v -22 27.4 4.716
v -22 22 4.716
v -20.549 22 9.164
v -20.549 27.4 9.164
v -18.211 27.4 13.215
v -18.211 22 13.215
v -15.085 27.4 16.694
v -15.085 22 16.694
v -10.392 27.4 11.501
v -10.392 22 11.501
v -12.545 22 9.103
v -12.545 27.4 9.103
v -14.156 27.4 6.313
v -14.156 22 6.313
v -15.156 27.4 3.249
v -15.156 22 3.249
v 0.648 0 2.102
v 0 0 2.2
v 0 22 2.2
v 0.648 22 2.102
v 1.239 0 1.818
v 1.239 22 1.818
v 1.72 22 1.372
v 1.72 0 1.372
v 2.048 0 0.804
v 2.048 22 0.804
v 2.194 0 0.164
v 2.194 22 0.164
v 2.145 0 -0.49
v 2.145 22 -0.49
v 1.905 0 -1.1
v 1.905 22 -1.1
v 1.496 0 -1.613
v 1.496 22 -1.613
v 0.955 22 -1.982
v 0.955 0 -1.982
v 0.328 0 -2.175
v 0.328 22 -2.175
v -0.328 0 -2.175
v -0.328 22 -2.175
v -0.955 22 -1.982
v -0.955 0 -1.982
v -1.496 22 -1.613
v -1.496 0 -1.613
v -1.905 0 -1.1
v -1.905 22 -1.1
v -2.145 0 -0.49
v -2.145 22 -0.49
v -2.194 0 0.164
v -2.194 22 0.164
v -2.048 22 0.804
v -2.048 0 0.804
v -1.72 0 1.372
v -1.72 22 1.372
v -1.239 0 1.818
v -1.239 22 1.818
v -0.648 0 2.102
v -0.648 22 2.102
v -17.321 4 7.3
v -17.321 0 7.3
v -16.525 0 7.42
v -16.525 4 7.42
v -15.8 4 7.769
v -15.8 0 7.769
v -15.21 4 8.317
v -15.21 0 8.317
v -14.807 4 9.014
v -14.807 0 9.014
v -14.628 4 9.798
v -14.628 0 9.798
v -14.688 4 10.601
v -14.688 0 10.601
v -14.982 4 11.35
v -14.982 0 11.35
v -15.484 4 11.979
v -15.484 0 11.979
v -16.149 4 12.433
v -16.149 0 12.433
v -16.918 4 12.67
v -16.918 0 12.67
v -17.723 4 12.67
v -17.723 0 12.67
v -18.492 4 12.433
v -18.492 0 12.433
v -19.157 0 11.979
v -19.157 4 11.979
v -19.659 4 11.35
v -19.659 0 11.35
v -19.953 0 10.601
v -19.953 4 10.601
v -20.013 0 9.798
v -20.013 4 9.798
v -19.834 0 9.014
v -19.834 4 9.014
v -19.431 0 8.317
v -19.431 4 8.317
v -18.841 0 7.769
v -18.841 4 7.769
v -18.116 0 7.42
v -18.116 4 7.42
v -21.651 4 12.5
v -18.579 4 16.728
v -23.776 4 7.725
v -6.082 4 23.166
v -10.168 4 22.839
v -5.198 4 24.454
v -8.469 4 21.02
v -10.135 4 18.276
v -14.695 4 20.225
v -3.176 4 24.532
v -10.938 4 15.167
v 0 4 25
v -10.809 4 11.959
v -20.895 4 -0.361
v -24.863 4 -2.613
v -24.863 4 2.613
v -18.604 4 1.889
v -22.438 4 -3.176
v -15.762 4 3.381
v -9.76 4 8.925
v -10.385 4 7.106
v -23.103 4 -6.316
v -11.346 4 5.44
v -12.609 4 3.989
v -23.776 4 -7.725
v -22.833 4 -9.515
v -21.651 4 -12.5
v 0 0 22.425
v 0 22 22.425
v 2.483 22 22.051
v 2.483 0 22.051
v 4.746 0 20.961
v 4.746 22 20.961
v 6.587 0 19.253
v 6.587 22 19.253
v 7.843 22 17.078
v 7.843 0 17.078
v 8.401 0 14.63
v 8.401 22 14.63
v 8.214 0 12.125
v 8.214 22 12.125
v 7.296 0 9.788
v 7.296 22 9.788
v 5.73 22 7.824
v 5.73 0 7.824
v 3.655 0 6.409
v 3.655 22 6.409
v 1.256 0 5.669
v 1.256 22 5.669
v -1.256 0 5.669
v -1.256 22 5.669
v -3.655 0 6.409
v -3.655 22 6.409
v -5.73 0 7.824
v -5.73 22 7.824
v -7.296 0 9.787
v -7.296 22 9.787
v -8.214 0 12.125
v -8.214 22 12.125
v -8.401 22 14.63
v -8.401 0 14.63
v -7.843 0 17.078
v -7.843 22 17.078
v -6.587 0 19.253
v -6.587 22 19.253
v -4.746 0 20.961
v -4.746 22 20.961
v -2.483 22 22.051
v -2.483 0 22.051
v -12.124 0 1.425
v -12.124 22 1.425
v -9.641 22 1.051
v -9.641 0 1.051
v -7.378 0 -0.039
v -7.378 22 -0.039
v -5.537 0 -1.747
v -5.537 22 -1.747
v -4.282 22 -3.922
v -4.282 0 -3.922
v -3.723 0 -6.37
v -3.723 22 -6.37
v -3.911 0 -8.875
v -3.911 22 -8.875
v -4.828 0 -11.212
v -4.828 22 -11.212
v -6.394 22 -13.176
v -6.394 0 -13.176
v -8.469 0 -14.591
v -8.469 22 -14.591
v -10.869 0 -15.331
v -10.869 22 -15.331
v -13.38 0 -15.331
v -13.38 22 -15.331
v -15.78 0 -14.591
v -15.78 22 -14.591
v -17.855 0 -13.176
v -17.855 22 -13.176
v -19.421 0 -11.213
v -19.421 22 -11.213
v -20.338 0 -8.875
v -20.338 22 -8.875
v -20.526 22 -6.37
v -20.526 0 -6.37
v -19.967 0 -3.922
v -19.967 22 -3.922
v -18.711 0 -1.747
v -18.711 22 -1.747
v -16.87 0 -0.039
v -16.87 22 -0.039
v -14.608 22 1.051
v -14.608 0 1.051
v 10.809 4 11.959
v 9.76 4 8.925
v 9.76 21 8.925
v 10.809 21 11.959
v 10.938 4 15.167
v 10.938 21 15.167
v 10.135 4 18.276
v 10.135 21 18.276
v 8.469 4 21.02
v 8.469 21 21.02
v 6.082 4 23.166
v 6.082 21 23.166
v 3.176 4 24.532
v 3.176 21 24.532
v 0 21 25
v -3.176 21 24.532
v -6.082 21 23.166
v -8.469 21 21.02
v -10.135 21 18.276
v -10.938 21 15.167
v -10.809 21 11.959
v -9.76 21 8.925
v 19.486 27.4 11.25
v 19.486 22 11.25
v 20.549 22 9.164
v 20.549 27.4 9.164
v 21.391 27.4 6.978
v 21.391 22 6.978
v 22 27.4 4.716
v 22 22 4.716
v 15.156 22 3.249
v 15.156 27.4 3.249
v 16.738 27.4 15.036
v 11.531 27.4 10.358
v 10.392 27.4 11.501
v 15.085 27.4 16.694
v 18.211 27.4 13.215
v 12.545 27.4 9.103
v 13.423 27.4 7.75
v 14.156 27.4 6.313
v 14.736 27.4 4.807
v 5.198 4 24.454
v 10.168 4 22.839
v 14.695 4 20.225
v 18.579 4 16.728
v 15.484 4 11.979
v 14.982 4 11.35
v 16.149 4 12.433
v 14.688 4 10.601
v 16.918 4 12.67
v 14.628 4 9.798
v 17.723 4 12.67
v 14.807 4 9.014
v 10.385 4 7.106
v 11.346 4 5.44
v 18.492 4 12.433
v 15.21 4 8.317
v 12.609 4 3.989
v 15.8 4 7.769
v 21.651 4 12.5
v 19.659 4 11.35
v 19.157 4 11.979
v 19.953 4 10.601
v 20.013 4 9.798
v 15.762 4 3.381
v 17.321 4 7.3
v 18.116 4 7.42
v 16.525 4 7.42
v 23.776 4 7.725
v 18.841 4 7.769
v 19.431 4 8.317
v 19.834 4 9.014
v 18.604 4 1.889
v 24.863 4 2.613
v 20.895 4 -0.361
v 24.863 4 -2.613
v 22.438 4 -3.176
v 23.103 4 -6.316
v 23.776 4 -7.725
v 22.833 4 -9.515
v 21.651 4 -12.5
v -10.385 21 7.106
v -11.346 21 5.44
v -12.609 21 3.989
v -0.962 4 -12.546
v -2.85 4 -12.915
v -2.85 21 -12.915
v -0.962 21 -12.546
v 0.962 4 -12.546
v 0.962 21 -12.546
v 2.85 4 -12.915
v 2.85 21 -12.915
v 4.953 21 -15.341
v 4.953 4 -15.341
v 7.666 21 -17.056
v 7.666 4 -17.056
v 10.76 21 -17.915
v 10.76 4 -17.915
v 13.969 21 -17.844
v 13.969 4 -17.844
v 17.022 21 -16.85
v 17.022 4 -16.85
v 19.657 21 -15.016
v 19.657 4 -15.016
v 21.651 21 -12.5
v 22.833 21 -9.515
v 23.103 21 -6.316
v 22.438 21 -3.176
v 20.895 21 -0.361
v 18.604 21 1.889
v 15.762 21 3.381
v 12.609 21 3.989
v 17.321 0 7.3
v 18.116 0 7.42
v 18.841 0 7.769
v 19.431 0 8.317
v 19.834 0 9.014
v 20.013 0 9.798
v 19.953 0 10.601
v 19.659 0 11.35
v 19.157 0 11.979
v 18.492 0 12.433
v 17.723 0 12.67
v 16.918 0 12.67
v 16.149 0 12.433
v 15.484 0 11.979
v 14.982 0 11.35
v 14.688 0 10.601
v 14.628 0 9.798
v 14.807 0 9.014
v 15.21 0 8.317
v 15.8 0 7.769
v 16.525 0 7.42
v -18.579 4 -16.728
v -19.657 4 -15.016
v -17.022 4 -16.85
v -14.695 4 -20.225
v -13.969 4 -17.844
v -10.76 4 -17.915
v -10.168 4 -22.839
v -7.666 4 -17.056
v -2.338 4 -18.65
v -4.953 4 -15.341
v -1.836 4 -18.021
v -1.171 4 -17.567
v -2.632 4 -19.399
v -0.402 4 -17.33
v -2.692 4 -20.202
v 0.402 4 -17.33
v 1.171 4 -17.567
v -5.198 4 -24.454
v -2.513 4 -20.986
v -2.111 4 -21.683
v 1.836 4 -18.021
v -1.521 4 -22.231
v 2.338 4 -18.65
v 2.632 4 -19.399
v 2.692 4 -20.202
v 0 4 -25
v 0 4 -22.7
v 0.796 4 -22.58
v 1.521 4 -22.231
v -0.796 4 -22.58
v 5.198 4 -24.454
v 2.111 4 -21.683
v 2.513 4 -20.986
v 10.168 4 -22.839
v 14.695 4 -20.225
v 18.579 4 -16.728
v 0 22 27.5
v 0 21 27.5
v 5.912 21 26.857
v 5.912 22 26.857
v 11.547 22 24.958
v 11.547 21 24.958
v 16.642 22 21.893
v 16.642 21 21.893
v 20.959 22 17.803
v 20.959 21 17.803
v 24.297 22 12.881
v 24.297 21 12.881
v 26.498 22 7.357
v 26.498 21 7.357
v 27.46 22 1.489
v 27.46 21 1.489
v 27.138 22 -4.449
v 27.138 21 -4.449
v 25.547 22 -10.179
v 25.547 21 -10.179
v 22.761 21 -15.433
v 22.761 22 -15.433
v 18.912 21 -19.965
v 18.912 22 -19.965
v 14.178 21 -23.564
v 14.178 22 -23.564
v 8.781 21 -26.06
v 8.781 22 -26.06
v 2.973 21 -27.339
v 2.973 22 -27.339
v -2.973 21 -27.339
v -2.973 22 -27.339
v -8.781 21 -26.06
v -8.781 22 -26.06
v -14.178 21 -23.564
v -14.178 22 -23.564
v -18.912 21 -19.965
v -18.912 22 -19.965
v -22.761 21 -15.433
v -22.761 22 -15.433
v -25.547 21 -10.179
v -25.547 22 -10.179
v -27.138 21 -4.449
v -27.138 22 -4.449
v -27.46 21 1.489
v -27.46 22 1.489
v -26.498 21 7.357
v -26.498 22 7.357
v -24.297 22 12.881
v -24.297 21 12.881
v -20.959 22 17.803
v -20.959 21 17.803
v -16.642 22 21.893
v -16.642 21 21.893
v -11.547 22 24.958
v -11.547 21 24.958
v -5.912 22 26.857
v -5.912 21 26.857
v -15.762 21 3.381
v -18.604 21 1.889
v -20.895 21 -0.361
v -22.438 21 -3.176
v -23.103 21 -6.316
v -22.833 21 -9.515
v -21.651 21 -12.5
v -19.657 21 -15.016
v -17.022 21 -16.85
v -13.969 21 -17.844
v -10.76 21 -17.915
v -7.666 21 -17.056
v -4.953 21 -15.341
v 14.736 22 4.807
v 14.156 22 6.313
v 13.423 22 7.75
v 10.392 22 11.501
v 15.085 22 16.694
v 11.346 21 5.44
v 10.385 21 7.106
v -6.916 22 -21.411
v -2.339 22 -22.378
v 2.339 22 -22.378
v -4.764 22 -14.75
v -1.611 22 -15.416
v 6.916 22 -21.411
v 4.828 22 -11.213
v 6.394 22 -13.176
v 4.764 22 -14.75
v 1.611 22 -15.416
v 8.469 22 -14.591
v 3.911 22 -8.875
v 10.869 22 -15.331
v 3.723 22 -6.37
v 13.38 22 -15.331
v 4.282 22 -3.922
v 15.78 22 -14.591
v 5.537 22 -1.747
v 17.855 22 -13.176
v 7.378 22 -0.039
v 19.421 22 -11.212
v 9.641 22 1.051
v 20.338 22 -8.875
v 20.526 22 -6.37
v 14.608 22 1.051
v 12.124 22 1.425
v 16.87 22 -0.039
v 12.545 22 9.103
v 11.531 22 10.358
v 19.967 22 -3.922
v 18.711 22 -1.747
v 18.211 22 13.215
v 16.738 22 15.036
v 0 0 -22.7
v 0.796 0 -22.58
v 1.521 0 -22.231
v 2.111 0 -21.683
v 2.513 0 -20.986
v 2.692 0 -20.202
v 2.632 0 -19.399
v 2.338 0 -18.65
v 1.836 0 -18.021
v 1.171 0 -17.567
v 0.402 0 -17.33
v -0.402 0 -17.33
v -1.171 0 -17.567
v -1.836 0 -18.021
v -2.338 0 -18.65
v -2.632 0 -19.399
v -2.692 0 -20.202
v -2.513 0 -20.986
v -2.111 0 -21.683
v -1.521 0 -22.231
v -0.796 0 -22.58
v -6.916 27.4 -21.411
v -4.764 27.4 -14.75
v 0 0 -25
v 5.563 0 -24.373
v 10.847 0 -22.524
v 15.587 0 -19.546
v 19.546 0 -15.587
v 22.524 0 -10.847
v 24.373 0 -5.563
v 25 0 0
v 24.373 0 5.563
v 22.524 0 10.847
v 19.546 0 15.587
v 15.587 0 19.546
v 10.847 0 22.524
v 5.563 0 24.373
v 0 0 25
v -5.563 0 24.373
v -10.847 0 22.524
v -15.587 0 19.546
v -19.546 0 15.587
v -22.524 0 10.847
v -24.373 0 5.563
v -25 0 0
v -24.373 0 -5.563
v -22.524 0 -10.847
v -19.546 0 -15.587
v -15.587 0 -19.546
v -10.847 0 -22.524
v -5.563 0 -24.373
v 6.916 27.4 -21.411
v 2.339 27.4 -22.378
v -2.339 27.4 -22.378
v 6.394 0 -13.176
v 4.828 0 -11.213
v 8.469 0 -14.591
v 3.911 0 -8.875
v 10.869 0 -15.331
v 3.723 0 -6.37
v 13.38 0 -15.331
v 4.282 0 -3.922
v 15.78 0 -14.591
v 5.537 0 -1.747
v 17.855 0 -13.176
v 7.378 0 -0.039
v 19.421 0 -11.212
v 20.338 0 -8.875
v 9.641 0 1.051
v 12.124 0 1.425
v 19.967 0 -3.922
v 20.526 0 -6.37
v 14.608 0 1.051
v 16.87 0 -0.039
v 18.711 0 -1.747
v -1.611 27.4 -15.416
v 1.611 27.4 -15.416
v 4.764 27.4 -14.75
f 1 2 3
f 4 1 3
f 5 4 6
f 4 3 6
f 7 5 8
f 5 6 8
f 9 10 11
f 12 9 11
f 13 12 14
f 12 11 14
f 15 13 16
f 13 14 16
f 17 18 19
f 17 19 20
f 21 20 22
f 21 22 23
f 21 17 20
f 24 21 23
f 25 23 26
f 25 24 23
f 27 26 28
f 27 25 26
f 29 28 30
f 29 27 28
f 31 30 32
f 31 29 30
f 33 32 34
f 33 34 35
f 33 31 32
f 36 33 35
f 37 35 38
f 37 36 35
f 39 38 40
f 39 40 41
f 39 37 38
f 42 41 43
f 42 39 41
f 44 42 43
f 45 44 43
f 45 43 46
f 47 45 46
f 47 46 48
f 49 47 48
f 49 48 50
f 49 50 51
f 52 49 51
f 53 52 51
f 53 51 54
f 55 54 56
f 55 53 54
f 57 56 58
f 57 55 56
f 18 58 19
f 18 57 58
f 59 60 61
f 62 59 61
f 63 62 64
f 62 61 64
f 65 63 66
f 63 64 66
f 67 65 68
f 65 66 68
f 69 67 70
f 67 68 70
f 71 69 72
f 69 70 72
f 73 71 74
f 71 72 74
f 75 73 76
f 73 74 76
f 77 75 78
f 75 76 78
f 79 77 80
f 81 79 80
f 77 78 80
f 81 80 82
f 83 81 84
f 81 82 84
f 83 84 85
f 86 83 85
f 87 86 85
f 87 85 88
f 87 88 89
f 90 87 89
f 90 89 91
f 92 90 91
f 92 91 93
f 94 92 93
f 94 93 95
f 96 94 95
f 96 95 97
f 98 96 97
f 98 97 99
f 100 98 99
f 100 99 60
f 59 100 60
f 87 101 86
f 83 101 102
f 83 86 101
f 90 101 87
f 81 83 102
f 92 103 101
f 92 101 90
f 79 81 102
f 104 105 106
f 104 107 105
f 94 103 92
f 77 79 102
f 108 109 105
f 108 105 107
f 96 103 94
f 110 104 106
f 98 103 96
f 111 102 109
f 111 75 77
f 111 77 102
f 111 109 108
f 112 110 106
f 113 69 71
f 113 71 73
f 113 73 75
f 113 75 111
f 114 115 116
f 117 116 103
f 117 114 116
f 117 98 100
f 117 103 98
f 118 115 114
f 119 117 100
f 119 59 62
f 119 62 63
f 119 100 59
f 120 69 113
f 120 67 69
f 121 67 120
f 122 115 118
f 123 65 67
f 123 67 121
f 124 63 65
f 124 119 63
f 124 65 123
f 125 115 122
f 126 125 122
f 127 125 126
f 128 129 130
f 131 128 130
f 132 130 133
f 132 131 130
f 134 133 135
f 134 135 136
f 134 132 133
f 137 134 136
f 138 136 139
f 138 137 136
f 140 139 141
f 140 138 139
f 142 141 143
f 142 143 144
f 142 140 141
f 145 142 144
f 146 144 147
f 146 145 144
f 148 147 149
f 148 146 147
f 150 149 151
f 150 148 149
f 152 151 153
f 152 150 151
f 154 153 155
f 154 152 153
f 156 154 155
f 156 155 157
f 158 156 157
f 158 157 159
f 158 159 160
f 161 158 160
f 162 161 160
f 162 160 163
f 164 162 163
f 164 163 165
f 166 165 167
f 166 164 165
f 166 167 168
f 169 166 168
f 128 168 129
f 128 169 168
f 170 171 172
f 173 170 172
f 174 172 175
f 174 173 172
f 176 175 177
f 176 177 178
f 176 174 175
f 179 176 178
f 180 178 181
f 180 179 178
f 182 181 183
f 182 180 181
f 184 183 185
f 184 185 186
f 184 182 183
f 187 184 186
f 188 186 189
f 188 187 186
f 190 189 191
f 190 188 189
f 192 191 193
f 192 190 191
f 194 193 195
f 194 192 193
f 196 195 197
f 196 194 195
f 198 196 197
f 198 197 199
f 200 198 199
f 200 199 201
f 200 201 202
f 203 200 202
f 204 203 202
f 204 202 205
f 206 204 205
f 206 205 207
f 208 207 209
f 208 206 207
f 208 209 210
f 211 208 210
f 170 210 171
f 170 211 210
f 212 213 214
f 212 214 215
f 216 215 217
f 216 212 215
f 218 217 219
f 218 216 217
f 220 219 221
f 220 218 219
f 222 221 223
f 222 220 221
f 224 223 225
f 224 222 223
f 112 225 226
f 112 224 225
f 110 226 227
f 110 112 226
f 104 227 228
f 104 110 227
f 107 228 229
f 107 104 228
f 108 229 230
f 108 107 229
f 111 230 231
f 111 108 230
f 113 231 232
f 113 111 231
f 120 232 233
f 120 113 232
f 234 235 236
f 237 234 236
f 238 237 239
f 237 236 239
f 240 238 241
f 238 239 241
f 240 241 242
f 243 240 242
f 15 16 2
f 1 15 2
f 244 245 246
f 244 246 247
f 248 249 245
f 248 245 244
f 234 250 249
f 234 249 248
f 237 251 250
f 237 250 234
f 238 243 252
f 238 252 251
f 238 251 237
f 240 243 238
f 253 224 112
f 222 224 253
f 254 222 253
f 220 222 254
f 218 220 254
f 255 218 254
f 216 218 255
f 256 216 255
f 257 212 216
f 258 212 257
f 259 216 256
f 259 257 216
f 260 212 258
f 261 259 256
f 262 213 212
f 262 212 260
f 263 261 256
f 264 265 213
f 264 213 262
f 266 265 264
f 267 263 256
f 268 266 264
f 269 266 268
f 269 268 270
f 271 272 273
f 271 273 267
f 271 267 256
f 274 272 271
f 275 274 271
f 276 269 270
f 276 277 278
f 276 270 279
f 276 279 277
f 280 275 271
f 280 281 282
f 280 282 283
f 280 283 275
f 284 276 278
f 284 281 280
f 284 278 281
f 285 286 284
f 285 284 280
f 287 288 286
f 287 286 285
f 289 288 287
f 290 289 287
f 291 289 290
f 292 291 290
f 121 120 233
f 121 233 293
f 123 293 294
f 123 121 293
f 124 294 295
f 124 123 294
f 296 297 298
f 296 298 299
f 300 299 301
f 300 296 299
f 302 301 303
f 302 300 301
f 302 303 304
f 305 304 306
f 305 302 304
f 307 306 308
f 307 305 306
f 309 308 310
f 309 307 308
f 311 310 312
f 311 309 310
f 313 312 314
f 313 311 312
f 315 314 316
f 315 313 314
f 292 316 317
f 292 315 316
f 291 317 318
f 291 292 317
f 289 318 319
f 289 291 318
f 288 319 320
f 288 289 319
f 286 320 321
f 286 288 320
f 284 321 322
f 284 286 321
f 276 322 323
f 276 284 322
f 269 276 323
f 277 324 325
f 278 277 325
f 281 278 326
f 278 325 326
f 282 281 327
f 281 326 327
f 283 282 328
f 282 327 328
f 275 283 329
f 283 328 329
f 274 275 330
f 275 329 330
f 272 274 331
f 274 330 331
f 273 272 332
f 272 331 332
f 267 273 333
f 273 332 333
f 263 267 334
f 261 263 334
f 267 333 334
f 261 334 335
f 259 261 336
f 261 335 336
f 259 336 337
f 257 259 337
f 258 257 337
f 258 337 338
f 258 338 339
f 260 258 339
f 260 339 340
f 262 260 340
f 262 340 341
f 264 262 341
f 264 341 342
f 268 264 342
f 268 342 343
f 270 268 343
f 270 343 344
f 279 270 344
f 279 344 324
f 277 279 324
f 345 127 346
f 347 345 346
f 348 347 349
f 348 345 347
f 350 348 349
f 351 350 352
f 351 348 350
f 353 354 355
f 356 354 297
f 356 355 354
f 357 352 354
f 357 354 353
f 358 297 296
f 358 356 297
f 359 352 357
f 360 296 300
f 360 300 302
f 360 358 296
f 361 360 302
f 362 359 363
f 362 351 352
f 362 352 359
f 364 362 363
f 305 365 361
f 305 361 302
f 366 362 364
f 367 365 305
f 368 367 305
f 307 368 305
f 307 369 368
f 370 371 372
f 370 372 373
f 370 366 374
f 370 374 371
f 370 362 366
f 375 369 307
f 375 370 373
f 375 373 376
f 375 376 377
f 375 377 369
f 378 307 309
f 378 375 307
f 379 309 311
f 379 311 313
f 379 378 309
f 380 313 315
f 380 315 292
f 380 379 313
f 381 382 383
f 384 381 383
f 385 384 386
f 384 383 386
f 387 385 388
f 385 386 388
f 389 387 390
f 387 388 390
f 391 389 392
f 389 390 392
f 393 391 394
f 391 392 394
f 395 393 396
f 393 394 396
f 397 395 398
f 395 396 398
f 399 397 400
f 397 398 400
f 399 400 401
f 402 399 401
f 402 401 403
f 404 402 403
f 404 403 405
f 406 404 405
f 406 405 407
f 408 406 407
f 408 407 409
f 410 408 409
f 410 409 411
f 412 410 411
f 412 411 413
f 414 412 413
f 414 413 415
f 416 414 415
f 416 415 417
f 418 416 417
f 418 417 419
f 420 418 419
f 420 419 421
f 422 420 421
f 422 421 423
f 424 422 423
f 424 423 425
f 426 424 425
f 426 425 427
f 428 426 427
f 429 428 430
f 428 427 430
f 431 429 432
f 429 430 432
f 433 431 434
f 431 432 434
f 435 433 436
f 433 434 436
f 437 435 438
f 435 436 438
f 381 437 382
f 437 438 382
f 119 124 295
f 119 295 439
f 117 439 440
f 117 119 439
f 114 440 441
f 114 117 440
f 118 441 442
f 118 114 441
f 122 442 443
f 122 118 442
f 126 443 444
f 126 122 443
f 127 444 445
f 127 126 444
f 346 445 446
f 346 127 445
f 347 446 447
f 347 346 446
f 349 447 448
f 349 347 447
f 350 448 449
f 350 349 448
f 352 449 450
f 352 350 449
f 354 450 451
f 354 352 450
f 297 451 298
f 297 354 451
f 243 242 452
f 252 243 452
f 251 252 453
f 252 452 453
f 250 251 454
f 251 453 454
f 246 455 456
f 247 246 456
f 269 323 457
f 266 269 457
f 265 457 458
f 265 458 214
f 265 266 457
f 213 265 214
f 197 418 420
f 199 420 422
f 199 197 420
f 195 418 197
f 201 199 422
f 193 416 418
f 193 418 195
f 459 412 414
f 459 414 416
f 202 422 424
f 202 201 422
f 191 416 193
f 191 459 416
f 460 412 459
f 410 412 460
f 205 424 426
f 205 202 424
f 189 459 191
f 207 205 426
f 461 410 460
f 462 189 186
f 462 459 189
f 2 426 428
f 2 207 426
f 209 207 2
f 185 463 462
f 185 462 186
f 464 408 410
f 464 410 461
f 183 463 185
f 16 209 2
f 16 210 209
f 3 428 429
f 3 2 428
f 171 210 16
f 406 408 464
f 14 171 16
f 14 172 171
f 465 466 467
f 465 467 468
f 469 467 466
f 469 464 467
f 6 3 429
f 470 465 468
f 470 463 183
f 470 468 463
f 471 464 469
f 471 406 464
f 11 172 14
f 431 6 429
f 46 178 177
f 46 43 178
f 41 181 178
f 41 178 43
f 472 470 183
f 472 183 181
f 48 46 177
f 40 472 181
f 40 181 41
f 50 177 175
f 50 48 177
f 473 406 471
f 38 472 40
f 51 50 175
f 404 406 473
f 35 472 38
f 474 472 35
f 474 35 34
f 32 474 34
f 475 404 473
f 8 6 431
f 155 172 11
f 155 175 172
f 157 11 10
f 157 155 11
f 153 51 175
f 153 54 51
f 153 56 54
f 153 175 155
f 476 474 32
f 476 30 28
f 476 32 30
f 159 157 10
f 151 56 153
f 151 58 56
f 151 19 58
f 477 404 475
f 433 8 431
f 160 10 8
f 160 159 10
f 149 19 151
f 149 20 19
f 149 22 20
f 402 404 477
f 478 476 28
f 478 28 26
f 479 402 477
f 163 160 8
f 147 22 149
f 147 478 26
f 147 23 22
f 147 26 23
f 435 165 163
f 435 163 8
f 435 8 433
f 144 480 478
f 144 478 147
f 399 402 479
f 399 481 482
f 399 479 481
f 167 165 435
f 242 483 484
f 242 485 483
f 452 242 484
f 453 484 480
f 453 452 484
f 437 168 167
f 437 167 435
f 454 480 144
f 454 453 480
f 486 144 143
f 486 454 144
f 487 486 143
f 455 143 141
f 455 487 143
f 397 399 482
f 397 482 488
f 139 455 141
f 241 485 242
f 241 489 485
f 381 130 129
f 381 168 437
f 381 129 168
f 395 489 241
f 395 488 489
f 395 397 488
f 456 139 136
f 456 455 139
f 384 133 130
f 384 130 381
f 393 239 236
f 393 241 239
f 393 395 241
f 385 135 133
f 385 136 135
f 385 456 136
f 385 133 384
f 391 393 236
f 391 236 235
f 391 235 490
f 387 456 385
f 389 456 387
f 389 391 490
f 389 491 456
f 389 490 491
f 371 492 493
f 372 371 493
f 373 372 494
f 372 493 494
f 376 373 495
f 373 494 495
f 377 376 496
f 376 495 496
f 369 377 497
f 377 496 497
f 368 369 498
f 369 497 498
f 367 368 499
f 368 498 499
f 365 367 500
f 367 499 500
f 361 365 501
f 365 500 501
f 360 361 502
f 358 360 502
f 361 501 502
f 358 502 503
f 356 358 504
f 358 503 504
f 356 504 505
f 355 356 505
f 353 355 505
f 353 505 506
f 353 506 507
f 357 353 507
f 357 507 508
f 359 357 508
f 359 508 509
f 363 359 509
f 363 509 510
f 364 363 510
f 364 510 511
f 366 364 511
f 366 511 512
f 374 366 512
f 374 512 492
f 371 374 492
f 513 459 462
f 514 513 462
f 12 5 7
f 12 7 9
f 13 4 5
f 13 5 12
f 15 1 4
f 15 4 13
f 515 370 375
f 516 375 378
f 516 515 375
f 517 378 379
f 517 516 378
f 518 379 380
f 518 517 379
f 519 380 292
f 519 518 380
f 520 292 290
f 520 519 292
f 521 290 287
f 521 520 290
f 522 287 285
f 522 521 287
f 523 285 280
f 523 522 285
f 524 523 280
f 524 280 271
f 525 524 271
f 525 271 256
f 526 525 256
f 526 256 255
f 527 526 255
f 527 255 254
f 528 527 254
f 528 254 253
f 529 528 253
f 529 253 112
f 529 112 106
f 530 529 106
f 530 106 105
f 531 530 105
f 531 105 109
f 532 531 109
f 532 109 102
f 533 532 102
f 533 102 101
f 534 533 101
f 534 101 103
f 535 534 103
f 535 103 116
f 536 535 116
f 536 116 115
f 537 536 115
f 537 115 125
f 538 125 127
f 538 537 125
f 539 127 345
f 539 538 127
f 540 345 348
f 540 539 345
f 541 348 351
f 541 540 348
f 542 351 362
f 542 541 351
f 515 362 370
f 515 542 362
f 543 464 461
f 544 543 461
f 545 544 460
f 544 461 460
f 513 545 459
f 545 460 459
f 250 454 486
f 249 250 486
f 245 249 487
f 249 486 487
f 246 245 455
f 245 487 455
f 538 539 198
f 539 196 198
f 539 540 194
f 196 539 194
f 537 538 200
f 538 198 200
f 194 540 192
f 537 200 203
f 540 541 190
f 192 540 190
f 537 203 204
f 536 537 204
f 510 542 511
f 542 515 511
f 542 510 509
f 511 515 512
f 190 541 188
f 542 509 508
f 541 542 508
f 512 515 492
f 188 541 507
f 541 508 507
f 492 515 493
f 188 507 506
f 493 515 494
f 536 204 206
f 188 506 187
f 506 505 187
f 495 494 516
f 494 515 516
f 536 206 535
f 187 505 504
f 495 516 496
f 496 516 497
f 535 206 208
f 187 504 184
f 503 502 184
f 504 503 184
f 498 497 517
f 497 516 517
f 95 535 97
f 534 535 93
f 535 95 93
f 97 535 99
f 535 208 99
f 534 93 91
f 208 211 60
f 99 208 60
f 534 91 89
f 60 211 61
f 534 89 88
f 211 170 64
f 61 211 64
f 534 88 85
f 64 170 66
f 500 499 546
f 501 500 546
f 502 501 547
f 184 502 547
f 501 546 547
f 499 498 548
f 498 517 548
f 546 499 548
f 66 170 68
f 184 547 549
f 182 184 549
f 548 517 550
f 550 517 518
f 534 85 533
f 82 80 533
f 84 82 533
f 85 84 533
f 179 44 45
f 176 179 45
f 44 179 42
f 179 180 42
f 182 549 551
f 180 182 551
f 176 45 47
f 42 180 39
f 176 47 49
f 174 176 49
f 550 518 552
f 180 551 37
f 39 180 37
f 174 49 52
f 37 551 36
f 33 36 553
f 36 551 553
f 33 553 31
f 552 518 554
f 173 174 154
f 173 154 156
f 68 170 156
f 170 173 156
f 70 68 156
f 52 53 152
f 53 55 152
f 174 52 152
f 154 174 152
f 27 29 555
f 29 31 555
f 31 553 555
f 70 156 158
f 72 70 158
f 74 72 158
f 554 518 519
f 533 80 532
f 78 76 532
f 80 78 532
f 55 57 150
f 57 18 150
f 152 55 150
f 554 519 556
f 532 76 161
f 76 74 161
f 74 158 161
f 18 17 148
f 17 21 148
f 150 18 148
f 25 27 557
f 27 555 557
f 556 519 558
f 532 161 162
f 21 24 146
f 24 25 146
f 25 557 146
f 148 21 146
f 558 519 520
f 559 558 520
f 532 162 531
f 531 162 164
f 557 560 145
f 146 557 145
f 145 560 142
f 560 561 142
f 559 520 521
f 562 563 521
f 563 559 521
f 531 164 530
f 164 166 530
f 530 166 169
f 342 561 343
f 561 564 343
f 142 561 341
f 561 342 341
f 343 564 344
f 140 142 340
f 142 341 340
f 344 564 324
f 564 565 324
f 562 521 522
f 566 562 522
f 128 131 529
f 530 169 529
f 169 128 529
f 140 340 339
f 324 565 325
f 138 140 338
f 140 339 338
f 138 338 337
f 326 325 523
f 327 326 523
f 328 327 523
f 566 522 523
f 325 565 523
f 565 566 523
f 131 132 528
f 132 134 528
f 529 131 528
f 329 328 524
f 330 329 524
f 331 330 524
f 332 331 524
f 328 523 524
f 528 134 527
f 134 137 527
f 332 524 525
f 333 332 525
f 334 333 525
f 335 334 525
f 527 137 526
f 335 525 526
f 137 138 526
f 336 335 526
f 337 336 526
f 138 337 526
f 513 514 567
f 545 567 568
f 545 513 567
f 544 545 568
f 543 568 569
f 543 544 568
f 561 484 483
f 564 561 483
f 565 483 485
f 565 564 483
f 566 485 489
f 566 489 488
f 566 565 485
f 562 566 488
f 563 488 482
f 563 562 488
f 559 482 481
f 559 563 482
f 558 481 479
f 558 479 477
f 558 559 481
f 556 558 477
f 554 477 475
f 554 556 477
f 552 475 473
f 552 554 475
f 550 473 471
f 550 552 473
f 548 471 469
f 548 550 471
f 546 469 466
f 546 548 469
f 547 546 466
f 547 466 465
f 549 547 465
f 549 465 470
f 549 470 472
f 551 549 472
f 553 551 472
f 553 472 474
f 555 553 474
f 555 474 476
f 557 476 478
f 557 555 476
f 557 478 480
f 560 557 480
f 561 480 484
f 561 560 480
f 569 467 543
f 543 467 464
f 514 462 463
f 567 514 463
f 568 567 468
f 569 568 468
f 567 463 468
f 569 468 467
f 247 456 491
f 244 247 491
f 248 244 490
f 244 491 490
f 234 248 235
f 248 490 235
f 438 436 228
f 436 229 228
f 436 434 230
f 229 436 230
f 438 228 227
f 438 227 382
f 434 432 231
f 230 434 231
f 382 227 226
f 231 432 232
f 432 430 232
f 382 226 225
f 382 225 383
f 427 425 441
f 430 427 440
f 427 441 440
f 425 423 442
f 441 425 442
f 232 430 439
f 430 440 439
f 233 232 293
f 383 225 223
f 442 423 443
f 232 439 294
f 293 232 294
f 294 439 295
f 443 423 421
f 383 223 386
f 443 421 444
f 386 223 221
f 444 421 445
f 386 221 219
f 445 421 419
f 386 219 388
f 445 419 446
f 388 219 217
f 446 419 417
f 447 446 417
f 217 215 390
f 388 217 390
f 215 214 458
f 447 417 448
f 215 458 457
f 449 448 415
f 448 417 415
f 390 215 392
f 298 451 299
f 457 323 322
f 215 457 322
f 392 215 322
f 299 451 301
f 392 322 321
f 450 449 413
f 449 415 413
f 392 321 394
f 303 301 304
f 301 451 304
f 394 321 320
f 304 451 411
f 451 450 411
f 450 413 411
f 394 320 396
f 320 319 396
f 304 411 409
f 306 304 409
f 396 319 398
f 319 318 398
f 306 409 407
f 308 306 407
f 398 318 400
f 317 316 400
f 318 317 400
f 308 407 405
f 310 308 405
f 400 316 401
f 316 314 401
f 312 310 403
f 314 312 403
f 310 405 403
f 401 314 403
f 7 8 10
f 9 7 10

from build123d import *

# Parameters (mm, degrees)
SKETCH1_R           = 27.5
SKETCH1_R_2         = 2.2
SKETCH1_R_3         = 8.425
BOSS_EXTRUDE1_DEPTH = 22
BOSS_EXTRUDE2_DEPTH = 5.4
SKETCH5_R           = 40.989273042
CUT_EXTRUDE1_DEPTH  = 17
SKETCH6_R           = 2.7
CUT_EXTRUDE2_DEPTH  = 5
SKETCH7_R           = 33.756466266
SKETCH7_R_2         = 25
CUT_EXTRUDE6_DEPTH  = 4


with BuildPart() as part:
    # Sketch1 → Boss-Extrude1 (new body)
    with BuildSketch(Plane(origin=(0, 0, 0), x_dir=(1, 0, 0), z_dir=(0, 1, 0))):
        Circle(SKETCH1_R)
        Circle(SKETCH1_R_2, mode=Mode.SUBTRACT)
        with Locations((0, -14)):
            Circle(SKETCH1_R_3, mode=Mode.SUBTRACT)
        with Locations((-12.124355653, 7)):
            Circle(SKETCH1_R_3, mode=Mode.SUBTRACT)
        with Locations((12.124355653, 7)):
            Circle(SKETCH1_R_3, mode=Mode.SUBTRACT)
    extrude(amount=BOSS_EXTRUDE1_DEPTH)

    # Sketch4 → Boss-Extrude2 (add)
    with BuildSketch(Plane(origin=(0, 22, 0), x_dir=(1, 0, 0), z_dir=(0, 1, 0))):
        with BuildLine():
            ThreePointArc((15.15564017, -3.249087725), (13.423393759, -7.75), (10.391612594, -11.500625535))
            Line((10.391612594, -11.500625535), (15.084598927, -16.694456422))
            ThreePointArc((15.084598927, -16.694456422), (19.485571585, -11.25), (22.000122827, -4.716417665))
            Line((22.000122827, -4.716417665), (15.15564017, -3.249087725))
        make_face()
        with BuildLine():
            Line((-15.084598927, -16.694456422), (-10.391612594, -11.500625535))
            ThreePointArc((-10.391612594, -11.500625535), (-13.423393759, -7.75), (-15.15564017, -3.249087725))
            Line((-15.15564017, -3.249087725), (-22.000122827, -4.716417665))
            ThreePointArc((-22.000122827, -4.716417665), (-19.485571585, -11.25), (-15.084598927, -16.694456422))
        make_face()
        with BuildLine():
            ThreePointArc((-4.764027576, 14.74971326), (0, 15.5), (4.764027576, 14.74971326))
            Line((4.764027576, 14.74971326), (6.9155239, 21.410874087))
            ThreePointArc((6.9155239, 21.410874087), (0, 22.5), (-6.9155239, 21.410874087))
            Line((-6.9155239, 21.410874087), (-4.764027576, 14.74971326))
        make_face()
    extrude(amount=BOSS_EXTRUDE2_DEPTH)

    # Sketch5 → Cut-Extrude1 (cut)
    with BuildSketch(Plane(origin=(0, 4, 0), x_dir=(1, 0, 0), z_dir=(0, 1, 0))):
        Circle(SKETCH5_R)
        with BuildLine():
            ThreePointArc((-2.849843175, 12.914678207), (0, 12.5), (2.849843175, 12.914678207))
            ThreePointArc((2.849843175, 12.914678207), (21.650635095, 12.5), (12.609360996, -3.989302517))
            ThreePointArc((12.609360996, -3.989302517), (10.825317547, -6.25), (9.759517821, -8.925375689))
            ThreePointArc((9.759517821, -8.925375689), (0, -25), (-9.759517821, -8.925375689))
            ThreePointArc((-9.759517821, -8.925375689), (-10.825317547, -6.25), (-12.609360996, -3.989302517))
            ThreePointArc((-12.609360996, -3.989302517), (-21.650635095, 12.5), (-2.849843175, 12.914678207))
        make_face(mode=Mode.SUBTRACT)
    extrude(amount=CUT_EXTRUDE1_DEPTH, mode=Mode.SUBTRACT)

    # Sketch6 → Cut-Extrude2 (cut)
    with BuildSketch(Plane.XZ):
        with Locations((0, -20)):
            Circle(SKETCH6_R)
        with Locations((-17.320508076, 10)):
            Circle(SKETCH6_R)
        with Locations((17.320508076, 10)):
            Circle(SKETCH6_R)
    extrude(amount=-CUT_EXTRUDE2_DEPTH, mode=Mode.SUBTRACT)

    # Sketch7 → Cut-Extrude6 (cut)
    with BuildSketch(Plane.XZ):
        Circle(SKETCH7_R)
        Circle(SKETCH7_R_2, mode=Mode.SUBTRACT)
    extrude(amount=-CUT_EXTRUDE6_DEPTH, mode=Mode.SUBTRACT)


solid = part.part
